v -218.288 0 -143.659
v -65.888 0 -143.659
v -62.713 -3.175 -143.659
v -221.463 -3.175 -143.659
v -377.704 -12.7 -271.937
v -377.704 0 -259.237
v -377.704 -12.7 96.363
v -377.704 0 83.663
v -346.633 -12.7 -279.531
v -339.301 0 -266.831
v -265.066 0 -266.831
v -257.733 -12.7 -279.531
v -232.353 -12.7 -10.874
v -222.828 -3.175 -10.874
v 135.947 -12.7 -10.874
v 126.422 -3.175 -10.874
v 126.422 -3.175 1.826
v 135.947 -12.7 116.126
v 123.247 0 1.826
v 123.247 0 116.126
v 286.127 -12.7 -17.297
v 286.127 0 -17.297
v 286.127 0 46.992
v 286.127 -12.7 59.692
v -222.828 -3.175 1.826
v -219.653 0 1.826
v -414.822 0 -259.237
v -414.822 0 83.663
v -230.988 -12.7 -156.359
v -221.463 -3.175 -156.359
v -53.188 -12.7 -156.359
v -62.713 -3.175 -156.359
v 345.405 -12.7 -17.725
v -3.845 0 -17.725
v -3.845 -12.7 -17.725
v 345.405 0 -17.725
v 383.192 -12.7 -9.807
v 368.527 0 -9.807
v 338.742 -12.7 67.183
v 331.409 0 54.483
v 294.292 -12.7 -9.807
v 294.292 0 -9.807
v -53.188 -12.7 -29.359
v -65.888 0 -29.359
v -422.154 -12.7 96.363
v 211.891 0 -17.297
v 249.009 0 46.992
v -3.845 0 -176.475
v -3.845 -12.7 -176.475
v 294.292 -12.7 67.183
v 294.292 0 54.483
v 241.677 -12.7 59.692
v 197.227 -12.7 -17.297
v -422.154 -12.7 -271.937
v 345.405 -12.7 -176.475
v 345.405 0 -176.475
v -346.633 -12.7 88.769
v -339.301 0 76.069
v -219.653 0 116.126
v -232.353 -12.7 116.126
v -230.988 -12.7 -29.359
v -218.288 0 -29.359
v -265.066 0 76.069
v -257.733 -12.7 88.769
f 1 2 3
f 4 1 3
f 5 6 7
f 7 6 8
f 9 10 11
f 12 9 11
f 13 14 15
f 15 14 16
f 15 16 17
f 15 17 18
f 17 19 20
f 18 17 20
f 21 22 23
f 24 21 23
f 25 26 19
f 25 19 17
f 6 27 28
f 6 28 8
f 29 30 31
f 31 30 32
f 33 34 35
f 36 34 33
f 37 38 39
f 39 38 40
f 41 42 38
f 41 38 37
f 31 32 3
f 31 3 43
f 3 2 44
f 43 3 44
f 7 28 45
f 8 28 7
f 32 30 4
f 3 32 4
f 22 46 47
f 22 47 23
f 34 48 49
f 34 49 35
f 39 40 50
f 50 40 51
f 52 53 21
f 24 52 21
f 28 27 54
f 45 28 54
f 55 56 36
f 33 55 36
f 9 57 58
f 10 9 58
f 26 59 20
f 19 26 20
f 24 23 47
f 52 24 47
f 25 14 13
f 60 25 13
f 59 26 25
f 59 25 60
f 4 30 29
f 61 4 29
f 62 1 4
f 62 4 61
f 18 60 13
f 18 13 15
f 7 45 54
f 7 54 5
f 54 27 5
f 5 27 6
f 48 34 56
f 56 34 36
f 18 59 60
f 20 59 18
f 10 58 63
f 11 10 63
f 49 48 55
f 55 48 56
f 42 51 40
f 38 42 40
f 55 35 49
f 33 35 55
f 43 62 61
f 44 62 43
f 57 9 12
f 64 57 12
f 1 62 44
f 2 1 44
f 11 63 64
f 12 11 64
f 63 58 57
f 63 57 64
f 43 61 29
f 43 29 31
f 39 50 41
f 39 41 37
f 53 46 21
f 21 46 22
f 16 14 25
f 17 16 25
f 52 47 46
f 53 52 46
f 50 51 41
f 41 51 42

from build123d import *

# Parameters (mm, degrees)
F0_W      = 368.3
F0_H      = 127
F1_DEPTH  = 12.7
F2_W      = 177.8
F2_H      = 127
F3_DEPTH  = 12.7
F4_SIZE   = 12.69999
F5_SIZE   = 12.69999
F6_W      = 3.175
F6_H      = 12.7
F7_DEPTH  = 368.3
F8_W      = 3.175
F8_H      = 12.7
F9_DEPTH  = 368.3
F10_SIZE  = 12.69999
F11_SIZE  = 12.69999
F12_W     = 349.25
F12_H     = 158.75
F13_DEPTH = 12.7
F14_W     = 44.45
F14_H     = 368.3
F15_DEPTH = 12.7
F17_DEPTH = 12.7
F18_SIZE  = 12.69999
F20_DEPTH = 368.3
F21_SIZE  = 12.69999
F22_W     = 88.9
F22_H     = 368.3
F23_DEPTH = 12.7
F25_DEPTH = 368.3
F27_DEPTH = 12.7
F28_SIZE  = 12.69999
F29_SIZE  = 12.69999


# Not quite as in the source:
# - a fillet or chamfer is up to 0.001 mm smaller than in the source, because OpenCascade refuses the exact size
# - a feature names something its author has since deleted; it is built from what else it names


with BuildPart() as f1:
    # F0 (on Front) → F1 (new body)
    with BuildSketch(Plane.XZ):
        with Locations((-48.202611506, 52.6261187441)):
            Rectangle(F0_W, F0_H)
    extrude(amount=F1_DEPTH)

    # F4 (size 12.7 in the source; OpenCascade refuses exactly that, so slightly less here)
    f4_edges = [f1.edges().sort_by_distance(p)[0] for p in [
        (135.947388, 0, 52.626119),
    ]]
    chamfer(f4_edges, length=F4_SIZE)

    # F6 (on face) → F7 (cut)
    with BuildSketch(Plane(origin=(-232.352611506, 0, 0), x_dir=(0, -1, 0), z_dir=(-1, 0, 0))):
        with Locations((1.5875, -4.5238812559)):
            Rectangle(F6_W, F6_H)
    extrude(amount=-F7_DEPTH, mode=Mode.SUBTRACT)

    # F10 (size 12.7 in the source; OpenCascade refuses exactly that, so slightly less here)
    f10_edges = [f1.edges().sort_by_distance(p)[0] for p in [
        (-232.352612, 0, 58.976119),
    ]]
    chamfer(f10_edges, length=F10_SIZE)


with BuildPart() as f3:
    # F2 (on Front) → F3 (new body)
    with BuildSketch(Plane.XZ):
        with Locations((-142.0882418752, -92.8593969557)):
            Rectangle(F2_W, F2_H)
    extrude(amount=F3_DEPTH)

    # F5 (size 12.7 in the source; OpenCascade refuses exactly that, so slightly less here)
    f5_edges = [f3.edges().sort_by_distance(p)[0] for p in [
        (-53.188242, 0, -92.859397),
    ]]
    chamfer(f5_edges, length=F5_SIZE)

    # F8 (on face) → F9 (cut)
    with BuildSketch(Plane(origin=(-230.9882418752, 0, 0), x_dir=(0, -1, 0), z_dir=(-1, 0, 0))):
        with Locations((1.5875, -150.0093969557)):
            Rectangle(F8_W, F8_H)
    extrude(amount=-F9_DEPTH, mode=Mode.SUBTRACT)

    # F11 (size 12.7 in the source; OpenCascade refuses exactly that, so slightly less here)
    f11_edges = [f3.edges().sort_by_distance(p)[0] for p in [
        (-230.988242, 0, -86.509397),
    ]]
    chamfer(f11_edges, length=F11_SIZE)


with BuildPart() as f13:
    # F12 (on Front) → F13 (new body)
    with BuildSketch(Plane.XZ):
        with Locations((170.78008526, -97.0997214928)):
            Rectangle(F12_W, F12_H)
    extrude(amount=F13_DEPTH)


with BuildPart() as f15:
    # F14 (on Front) → F15 (new body)
    with BuildSketch(Plane.XZ):
        with Locations((-399.9289679691, -87.7866384085)):
            Rectangle(F14_W, F14_H)
    extrude(amount=F15_DEPTH)

    # F19 (on face) → F20 (cut)
    with BuildSketch(Plane(origin=(0, 0, -271.9366384085), x_dir=(1, 0, 0), z_dir=(0, 0, -1))):
        Polygon((-414.8216195504, 0), (-422.1539679691, 12.7), (-422.1539679691, 0), align=None)
    extrude(amount=-F20_DEPTH, mode=Mode.SUBTRACT)

    # F21 (size 12.7 in the source; OpenCascade refuses exactly that, so slightly less here)
    f21_edges = [f15.edges().sort_by_distance(p)[0] for p in [
        (-396.262794, 0, 96.363362),
        (-396.262794, 0, -271.936638),
    ]]
    chamfer(f21_edges, length=F21_SIZE)


with BuildPart() as f17:
    # F16 (on Front) → F17 (new body)
    with BuildSketch(Plane.XZ):
        Polygon((294.2917943001, 67.1830539138), (294.2917943001, -9.8066044826), (383.1917943001, -9.8066044826), (338.7417943001, 67.1830539138), align=None)
    extrude(amount=F17_DEPTH)

    # F18 (size 12.7 in the source; OpenCascade refuses exactly that, so slightly less here)
    f18_edges = [f17.edges().sort_by_distance(p)[0] for p in [
        (360.966794, 0, 28.688225),
        (316.516794, 0, 67.183054),
    ]]
    chamfer(f18_edges, length=F18_SIZE)


with BuildPart() as f23:
    # F22 (on Front) → F23 (new body)
    with BuildSketch(Plane.XZ):
        with Locations((-302.1833447643, -95.3806303442)):
            Rectangle(F22_W, F22_H)
    extrude(amount=F23_DEPTH)

    # F24 (on face) → F25 (cut)
    with BuildSketch(Plane.XY.offset(88.7693696558)):
        Polygon((-346.6333447643, 0), (-346.6333447643, -12.7), (-339.3009963456, 0), align=None)
        Polygon((-265.065693183, 0), (-257.7333447643, -12.7), (-257.7333447643, 0), align=None)
    extrude(amount=-F25_DEPTH, mode=Mode.SUBTRACT)

    # F29 (size 12.7 in the source; OpenCascade refuses exactly that, so slightly less here)
    f29_edges = [f23.edges().sort_by_distance(p)[0] for p in [
        (-302.183345, 0, 88.76937),
        (-302.183345, 0, -279.53063),
    ]]
    chamfer(f29_edges, length=F29_SIZE)


with BuildPart() as f27:
    # F26 (on Front) → F27 (new body)
    with BuildSketch(Plane.XZ):
        Polygon((197.2266658425, -17.2972651758), (286.1266658425, -17.2972651758), (286.1266658425, 59.6923932206), (241.6766658425, 59.6923932206), align=None)
    extrude(amount=F27_DEPTH)

    # F28 (size 12.7 in the source; OpenCascade refuses exactly that, so slightly less here)
    f28_edges = [f27.edges().sort_by_distance(p)[0] for p in [
        (219.451666, 0, 21.197564),
        (263.901666, 0, 59.692393),
    ]]
    chamfer(f28_edges, length=F28_SIZE)


solid = Compound([f1.part, f3.part, f13.part, f15.part, f17.part, f23.part, f27.part])
